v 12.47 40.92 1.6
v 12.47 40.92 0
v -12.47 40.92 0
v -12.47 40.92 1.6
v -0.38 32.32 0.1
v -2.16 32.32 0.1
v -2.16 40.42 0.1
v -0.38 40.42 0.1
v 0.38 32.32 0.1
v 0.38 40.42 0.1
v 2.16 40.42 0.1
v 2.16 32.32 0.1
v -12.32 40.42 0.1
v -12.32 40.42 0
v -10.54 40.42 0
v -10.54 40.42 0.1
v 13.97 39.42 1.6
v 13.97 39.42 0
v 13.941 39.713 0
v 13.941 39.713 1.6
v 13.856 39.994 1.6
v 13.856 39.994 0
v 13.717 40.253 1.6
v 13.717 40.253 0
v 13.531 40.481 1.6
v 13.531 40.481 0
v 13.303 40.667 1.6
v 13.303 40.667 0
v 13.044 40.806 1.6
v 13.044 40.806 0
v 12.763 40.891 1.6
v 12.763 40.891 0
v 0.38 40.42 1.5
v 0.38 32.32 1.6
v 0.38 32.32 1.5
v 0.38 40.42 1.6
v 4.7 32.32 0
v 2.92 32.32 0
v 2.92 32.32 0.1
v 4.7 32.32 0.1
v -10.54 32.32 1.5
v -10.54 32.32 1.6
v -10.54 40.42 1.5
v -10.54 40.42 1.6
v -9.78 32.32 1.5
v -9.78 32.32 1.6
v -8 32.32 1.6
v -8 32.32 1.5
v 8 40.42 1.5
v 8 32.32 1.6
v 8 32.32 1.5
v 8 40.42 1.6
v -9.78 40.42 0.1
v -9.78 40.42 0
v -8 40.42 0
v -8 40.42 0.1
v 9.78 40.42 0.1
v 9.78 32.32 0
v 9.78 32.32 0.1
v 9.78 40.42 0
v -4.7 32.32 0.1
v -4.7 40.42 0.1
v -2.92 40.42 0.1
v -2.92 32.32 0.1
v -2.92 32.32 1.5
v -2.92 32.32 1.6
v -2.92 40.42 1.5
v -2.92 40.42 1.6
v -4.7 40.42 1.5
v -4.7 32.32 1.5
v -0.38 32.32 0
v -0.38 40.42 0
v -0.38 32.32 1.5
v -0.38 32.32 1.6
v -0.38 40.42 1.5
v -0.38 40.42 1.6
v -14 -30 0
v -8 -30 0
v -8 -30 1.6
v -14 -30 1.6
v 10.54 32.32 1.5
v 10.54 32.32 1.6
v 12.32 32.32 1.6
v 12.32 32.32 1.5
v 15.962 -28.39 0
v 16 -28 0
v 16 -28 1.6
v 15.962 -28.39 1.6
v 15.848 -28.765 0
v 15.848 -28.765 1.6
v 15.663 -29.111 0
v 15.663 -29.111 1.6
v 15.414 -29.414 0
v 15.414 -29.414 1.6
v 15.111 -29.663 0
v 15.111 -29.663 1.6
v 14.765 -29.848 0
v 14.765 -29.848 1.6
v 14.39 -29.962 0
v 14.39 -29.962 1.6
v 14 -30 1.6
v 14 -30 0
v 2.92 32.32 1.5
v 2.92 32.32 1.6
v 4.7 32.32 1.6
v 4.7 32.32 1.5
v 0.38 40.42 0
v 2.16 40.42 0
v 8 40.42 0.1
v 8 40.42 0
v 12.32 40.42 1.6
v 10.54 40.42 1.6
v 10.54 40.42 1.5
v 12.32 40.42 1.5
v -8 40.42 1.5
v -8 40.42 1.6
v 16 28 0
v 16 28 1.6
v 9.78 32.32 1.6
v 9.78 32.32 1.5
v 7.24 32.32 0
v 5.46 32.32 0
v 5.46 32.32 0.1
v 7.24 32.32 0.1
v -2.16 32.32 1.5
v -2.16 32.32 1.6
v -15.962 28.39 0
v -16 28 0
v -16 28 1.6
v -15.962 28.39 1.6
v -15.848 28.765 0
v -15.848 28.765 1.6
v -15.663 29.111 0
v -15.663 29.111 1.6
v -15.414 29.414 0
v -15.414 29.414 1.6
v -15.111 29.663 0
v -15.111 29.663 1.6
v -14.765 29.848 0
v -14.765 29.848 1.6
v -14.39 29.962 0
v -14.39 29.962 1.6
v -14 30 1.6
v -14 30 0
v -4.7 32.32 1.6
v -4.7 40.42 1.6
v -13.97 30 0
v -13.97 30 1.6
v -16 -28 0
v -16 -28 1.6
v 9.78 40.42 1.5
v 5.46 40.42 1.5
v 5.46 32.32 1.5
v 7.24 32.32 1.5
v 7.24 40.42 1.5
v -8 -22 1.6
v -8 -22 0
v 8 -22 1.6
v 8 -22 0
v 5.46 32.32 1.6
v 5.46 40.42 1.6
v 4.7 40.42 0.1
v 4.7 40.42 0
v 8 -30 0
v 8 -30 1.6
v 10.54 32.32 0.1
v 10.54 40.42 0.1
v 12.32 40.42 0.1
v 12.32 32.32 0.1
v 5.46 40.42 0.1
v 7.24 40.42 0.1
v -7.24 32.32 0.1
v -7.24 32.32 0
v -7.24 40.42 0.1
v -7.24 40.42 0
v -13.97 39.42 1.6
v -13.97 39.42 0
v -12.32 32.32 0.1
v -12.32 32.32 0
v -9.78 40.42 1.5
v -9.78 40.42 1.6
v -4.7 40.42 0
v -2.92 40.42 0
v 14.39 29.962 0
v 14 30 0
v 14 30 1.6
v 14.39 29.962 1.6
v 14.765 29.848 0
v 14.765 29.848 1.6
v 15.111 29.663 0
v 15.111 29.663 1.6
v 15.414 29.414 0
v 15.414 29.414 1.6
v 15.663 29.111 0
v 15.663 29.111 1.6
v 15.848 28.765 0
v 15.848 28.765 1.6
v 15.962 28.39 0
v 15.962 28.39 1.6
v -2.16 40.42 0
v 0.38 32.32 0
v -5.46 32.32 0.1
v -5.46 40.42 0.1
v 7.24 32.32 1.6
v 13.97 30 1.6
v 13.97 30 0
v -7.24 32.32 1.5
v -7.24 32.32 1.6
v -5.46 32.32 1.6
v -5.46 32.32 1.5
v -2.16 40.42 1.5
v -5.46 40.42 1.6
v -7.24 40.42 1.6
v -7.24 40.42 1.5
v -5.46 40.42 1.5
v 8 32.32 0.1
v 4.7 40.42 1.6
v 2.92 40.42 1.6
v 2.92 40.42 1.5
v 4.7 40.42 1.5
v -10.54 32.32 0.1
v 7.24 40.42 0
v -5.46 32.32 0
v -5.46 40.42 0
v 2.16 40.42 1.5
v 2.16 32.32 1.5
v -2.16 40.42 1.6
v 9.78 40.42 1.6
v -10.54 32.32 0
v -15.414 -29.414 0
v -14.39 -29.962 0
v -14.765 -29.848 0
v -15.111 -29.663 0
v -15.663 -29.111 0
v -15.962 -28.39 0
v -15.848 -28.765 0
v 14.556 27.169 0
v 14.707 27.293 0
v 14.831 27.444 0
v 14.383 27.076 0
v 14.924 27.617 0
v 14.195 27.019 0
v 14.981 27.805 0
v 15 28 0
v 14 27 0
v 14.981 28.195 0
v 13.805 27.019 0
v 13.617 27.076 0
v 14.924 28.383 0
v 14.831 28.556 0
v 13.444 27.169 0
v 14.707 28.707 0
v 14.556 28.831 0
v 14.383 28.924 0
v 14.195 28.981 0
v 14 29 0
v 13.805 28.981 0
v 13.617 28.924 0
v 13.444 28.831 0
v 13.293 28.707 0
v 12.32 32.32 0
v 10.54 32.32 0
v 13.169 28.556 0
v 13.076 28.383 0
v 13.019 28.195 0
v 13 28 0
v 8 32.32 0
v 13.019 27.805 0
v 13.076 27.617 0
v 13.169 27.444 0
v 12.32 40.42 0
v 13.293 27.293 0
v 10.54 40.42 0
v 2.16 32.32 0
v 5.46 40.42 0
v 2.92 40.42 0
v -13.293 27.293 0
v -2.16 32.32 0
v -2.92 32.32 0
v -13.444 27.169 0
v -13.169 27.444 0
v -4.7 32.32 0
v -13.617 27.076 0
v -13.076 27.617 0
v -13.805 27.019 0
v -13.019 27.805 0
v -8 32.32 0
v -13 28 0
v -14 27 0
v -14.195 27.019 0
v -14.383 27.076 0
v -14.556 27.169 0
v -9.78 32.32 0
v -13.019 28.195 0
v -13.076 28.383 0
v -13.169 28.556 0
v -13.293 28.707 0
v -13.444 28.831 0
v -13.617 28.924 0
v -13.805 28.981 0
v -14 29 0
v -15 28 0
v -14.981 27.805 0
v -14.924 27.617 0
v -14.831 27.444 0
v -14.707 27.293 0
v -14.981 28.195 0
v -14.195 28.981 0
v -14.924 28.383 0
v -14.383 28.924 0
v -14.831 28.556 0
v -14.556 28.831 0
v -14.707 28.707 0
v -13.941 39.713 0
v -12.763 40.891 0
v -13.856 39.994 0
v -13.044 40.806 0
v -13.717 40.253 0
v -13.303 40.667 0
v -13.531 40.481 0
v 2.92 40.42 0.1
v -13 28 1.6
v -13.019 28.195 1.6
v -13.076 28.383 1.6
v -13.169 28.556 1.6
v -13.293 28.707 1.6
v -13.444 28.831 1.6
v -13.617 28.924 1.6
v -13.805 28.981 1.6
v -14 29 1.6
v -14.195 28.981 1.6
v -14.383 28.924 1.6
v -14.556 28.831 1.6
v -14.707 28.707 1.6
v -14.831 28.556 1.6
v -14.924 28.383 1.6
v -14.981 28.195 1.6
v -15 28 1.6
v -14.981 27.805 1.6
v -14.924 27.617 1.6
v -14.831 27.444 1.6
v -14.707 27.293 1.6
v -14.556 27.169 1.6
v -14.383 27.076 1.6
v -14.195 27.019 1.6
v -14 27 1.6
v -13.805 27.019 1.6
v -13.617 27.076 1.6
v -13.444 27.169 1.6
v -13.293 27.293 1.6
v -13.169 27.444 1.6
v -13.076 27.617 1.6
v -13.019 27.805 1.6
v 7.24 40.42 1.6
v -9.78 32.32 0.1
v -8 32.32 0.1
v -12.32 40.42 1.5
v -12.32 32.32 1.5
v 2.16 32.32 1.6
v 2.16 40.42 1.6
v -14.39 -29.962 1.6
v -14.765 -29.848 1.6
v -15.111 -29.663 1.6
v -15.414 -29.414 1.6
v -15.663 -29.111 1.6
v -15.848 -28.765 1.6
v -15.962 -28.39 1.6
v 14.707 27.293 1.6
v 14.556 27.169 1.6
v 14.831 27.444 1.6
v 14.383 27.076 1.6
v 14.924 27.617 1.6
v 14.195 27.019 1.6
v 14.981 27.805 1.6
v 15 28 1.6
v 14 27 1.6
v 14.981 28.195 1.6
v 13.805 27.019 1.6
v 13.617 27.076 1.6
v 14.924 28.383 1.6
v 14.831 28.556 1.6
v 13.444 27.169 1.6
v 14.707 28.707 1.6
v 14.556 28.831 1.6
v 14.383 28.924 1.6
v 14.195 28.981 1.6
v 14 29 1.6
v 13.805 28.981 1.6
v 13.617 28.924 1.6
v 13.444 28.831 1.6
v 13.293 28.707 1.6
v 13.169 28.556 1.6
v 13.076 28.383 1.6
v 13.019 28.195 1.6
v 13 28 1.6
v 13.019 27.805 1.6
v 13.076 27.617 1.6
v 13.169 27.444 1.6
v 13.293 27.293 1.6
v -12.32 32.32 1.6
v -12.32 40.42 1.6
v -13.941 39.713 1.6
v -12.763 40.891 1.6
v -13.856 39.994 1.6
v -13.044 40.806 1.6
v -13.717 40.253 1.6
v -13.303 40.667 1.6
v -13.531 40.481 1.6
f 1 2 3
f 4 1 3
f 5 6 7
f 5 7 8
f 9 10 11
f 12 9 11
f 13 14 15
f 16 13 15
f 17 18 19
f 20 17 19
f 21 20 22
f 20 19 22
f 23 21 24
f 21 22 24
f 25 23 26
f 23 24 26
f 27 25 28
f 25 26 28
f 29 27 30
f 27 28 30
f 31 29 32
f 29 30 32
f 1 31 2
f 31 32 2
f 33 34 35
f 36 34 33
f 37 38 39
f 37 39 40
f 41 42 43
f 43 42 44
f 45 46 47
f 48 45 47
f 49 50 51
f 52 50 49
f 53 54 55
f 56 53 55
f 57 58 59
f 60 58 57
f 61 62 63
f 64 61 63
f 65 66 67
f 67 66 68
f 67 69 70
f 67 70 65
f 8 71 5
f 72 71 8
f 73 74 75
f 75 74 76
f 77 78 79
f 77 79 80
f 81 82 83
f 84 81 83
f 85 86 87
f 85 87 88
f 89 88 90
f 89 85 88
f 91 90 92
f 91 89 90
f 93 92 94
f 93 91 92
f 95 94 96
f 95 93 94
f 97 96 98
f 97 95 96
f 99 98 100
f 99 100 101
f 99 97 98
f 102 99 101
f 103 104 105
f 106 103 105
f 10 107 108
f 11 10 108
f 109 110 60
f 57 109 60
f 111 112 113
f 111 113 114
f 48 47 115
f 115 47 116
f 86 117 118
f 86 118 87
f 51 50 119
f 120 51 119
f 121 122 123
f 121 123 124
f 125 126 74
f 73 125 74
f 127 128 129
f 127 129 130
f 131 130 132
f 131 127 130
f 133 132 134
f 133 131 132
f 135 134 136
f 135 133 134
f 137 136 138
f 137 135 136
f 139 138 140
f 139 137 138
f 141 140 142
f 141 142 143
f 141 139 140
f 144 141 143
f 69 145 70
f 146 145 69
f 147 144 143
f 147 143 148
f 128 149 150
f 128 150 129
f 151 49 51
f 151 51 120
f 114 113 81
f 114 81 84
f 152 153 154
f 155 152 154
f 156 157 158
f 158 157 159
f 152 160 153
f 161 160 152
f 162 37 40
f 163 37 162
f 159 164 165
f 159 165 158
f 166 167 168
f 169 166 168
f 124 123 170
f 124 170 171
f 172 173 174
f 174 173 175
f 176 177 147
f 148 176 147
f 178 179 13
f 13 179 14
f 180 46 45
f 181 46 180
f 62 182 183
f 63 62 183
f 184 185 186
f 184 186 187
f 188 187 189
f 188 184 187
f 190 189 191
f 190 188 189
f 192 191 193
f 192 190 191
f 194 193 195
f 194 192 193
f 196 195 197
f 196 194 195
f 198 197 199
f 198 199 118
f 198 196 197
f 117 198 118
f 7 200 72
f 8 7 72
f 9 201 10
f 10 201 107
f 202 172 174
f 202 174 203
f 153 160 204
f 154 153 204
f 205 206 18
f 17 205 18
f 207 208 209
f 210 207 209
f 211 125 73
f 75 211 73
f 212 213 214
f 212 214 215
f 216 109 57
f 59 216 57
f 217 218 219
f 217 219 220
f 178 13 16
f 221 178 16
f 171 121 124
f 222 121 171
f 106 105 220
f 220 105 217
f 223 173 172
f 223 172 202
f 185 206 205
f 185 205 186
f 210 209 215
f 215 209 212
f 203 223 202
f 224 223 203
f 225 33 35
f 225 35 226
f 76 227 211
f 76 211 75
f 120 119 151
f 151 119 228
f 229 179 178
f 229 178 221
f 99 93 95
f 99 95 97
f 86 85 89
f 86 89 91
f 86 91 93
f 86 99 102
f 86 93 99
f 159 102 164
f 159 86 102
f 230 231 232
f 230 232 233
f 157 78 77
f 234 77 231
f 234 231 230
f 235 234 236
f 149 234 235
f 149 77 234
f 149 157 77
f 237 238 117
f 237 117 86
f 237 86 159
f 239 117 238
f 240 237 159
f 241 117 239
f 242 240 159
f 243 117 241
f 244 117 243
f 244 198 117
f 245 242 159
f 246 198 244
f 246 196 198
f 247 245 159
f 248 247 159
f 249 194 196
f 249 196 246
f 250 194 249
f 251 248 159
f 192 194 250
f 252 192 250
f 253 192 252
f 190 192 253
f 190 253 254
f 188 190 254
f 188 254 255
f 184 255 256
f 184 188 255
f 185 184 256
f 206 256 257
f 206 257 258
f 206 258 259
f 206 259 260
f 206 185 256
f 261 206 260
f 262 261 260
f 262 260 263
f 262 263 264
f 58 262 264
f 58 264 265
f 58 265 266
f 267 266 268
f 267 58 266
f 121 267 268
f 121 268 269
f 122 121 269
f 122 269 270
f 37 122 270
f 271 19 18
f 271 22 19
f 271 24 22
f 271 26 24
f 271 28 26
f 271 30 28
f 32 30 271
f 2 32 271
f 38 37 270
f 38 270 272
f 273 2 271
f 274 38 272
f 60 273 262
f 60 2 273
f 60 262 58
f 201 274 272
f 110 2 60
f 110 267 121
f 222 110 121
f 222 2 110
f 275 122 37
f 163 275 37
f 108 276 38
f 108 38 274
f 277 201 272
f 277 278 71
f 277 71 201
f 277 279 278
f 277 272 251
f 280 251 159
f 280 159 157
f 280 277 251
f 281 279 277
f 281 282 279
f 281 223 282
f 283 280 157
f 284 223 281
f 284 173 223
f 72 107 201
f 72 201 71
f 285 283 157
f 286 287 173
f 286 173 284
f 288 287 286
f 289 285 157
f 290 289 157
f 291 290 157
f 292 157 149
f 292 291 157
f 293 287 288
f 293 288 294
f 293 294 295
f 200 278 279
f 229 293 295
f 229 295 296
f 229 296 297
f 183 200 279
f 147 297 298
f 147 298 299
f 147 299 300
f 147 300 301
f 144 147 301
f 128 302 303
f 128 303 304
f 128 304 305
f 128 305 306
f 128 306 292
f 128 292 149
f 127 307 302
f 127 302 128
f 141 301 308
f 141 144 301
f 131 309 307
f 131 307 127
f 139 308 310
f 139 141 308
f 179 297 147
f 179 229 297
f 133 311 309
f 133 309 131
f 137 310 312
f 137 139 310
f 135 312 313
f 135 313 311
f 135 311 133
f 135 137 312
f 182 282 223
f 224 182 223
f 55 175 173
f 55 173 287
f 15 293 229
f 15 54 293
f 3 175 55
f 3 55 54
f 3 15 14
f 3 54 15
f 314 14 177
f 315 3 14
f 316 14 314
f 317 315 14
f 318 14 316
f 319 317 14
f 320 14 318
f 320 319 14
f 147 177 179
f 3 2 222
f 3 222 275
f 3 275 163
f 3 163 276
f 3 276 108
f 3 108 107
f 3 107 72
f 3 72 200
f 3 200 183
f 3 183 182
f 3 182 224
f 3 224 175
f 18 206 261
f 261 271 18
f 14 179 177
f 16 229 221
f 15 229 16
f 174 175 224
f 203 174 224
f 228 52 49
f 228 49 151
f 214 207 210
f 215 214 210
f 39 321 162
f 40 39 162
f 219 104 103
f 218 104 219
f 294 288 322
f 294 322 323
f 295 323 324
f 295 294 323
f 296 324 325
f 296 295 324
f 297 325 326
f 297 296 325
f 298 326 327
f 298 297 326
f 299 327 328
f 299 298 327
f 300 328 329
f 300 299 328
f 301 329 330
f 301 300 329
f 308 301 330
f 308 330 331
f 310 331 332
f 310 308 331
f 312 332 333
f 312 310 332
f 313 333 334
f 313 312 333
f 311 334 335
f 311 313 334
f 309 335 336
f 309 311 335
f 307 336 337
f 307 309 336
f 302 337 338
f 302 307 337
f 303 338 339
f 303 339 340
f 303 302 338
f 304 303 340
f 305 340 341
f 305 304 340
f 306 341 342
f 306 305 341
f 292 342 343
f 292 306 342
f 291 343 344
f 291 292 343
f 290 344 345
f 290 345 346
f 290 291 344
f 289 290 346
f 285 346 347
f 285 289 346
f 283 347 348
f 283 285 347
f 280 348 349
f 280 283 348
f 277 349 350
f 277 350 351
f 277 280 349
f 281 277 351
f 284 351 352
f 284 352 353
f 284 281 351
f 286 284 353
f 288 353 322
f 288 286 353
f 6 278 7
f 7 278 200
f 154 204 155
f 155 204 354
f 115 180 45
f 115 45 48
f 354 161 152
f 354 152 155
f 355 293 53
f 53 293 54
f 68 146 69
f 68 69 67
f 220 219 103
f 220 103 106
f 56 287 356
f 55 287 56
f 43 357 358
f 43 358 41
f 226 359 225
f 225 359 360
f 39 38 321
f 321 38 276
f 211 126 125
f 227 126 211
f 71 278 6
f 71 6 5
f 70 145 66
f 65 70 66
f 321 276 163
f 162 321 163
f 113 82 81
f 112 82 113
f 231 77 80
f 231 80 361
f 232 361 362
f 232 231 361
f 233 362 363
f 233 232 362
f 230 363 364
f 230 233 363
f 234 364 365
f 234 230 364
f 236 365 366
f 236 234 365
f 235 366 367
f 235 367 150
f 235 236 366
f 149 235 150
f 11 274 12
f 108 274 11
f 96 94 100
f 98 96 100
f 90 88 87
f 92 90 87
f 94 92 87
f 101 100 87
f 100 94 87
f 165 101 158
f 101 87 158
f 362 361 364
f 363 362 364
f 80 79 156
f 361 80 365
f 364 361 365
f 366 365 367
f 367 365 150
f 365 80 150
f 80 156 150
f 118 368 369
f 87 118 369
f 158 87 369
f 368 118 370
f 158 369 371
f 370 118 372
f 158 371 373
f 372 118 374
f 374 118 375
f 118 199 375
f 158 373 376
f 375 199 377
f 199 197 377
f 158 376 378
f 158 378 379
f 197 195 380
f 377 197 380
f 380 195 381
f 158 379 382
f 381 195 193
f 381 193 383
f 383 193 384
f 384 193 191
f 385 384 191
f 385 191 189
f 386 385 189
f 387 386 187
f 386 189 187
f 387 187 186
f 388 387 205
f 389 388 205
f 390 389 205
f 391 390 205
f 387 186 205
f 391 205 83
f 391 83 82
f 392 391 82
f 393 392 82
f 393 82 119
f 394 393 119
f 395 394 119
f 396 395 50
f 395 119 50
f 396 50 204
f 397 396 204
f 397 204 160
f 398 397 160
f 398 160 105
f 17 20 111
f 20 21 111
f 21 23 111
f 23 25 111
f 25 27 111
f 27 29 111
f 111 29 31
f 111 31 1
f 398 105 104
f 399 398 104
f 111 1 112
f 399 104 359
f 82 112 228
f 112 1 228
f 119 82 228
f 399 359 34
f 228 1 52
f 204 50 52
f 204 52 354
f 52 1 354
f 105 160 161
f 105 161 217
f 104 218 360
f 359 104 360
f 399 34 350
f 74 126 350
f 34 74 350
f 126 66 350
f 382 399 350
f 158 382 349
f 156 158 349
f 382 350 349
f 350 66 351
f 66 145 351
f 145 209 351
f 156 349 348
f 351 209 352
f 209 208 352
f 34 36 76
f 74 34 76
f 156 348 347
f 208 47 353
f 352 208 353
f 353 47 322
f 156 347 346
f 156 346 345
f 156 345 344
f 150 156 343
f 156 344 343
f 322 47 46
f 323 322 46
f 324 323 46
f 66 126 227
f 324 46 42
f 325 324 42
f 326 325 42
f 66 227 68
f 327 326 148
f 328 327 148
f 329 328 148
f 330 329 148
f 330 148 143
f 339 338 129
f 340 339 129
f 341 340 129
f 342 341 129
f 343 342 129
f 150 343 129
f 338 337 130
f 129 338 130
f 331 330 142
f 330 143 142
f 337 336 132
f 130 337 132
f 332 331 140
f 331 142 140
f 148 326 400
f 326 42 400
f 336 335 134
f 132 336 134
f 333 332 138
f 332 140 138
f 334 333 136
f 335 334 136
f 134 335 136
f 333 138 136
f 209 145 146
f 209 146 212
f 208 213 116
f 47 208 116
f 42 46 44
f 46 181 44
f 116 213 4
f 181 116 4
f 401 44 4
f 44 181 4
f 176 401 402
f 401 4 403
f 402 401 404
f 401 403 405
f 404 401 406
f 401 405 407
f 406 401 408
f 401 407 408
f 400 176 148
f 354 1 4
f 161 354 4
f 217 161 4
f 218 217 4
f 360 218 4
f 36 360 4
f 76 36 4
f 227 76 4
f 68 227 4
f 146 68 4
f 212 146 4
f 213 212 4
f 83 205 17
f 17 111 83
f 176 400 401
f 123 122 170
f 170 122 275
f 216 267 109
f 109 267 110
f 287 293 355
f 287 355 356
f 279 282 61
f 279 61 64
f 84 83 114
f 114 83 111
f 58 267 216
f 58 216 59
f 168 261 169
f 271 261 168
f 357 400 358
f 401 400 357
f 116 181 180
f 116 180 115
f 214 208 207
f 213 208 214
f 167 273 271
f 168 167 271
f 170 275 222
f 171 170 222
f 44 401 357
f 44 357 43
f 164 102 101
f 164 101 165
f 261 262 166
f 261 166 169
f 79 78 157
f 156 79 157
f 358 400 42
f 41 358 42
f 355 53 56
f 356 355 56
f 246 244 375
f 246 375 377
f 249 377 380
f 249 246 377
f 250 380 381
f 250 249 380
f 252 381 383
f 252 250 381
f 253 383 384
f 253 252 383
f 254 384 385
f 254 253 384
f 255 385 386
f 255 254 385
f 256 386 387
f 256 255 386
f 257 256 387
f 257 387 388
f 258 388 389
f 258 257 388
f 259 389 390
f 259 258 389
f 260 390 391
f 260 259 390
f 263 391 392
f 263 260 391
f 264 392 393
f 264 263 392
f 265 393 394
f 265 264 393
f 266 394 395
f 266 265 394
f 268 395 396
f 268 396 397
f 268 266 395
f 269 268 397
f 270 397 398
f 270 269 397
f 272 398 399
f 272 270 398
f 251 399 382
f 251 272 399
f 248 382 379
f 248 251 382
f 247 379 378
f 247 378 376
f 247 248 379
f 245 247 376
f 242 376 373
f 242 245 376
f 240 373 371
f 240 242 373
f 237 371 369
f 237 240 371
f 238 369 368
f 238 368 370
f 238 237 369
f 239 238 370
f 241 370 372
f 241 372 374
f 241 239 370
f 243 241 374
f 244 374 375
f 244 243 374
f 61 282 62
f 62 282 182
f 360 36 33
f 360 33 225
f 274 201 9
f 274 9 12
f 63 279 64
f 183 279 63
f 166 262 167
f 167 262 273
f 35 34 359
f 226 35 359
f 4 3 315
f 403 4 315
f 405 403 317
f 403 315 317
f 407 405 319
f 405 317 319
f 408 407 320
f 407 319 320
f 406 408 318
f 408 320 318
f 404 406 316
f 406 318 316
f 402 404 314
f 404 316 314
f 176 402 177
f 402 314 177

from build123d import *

# Parameters (mm, degrees)
SKETCH_1_R          = 1
EXTRUDE_1_DEPTH     = 1.6
SKETCH_2_W          = 16
SKETCH_2_H          = 8
CUT_EXTRUDE_1_DEPTH = 1.6
EXTRUDE_2_DEPTH     = 1.6
SKETCH_4_W          = 1.78
SKETCH_4_H          = 8.1
CUT_EXTRUDE_2_DEPTH = 0.1
CUT_EXTRUDE_START   = 1.6
SKETCH_5_W          = 1.78
SKETCH_5_H          = 8.1
CUT_EXTRUDE_3_DEPTH = 0.1


with BuildPart() as part:
    # 草图1 → 凸台-拉伸1 (new body)
    with BuildSketch(Plane.XY):
        with BuildLine():
            Line((-14, 30), (14, 30))
            ThreePointArc((14, 30), (15.414213562, 29.414213562), (16, 28))
            Line((16, 28), (16, -28))
            ThreePointArc((16, -28), (15.414213562, -29.414213562), (14, -30))
            Line((14, -30), (-14, -30))
            ThreePointArc((-14, -30), (-15.414213562, -29.414213562), (-16, -28))
            Line((-16, -28), (-16, 28))
            ThreePointArc((-16, 28), (-15.414213562, 29.414213562), (-14, 30))
        make_face()
        with Locations((-14, 28)):
            Circle(SKETCH_1_R, mode=Mode.SUBTRACT)
        with Locations((14, 28)):
            Circle(SKETCH_1_R, mode=Mode.SUBTRACT)
    extrude(amount=EXTRUDE_1_DEPTH)

    # 草图2 → 切除-拉伸1 (cut)
    with BuildSketch(Plane.XY):
        with Locations((0, -26)):
            Rectangle(SKETCH_2_W, SKETCH_2_H)
    extrude(amount=CUT_EXTRUDE_1_DEPTH, mode=Mode.SUBTRACT)

    # 草图3 → 凸台-拉伸2 (add)
    with BuildSketch(Plane.XY):
        with BuildLine():
            Line((-13.97, 30), (13.97, 30))
            Line((13.97, 30), (13.97, 39.42))
            ThreePointArc((13.97, 39.42), (13.530660172, 40.480660172), (12.47, 40.92))
            Line((12.47, 40.92), (-12.47, 40.92))
            ThreePointArc((-12.47, 40.92), (-13.530660172, 40.480660172), (-13.97, 39.42))
            Line((-13.97, 39.42), (-13.97, 30))
        make_face()
    extrude(amount=EXTRUDE_2_DEPTH)

    # 草图4 → 切除-拉伸2 (cut)
    with BuildSketch(Plane.XY):
        with Locations((-1.27, 36.37)):
            Rectangle(SKETCH_4_W, SKETCH_4_H)
        with Locations((-3.81, 36.37)):
            Rectangle(SKETCH_4_W, SKETCH_4_H)
        with Locations((-6.35, 36.37)):
            Rectangle(SKETCH_4_W, SKETCH_4_H)
        with Locations((-8.89, 36.37)):
            Rectangle(SKETCH_4_W, SKETCH_4_H)
        with Locations((-11.43, 36.37)):
            Rectangle(SKETCH_4_W, SKETCH_4_H)
        with Locations((11.43, 36.37)):
            Rectangle(SKETCH_4_W, SKETCH_4_H)
        with Locations((8.89, 36.37)):
            Rectangle(SKETCH_4_W, SKETCH_4_H)
        with Locations((6.35, 36.37)):
            Rectangle(SKETCH_4_W, SKETCH_4_H)
        with Locations((3.81, 36.37)):
            Rectangle(SKETCH_4_W, SKETCH_4_H)
        with Locations((1.27, 36.37)):
            Rectangle(SKETCH_4_W, SKETCH_4_H)
    extrude(amount=CUT_EXTRUDE_2_DEPTH, mode=Mode.SUBTRACT)

    # 草图5 → 切除-拉伸3 (cut)
    with BuildSketch(Plane.XY.offset(CUT_EXTRUDE_START)):
        with Locations((-3.81, 36.37)):
            Rectangle(SKETCH_5_W, SKETCH_5_H)
        with Locations((-1.27, 36.37)):
            Rectangle(SKETCH_5_W, SKETCH_5_H)
        with Locations((-11.43, 36.37)):
            Rectangle(SKETCH_5_W, SKETCH_5_H)
        with Locations((-8.89, 36.37)):
            Rectangle(SKETCH_5_W, SKETCH_5_H)
        with Locations((-6.35, 36.37)):
            Rectangle(SKETCH_5_W, SKETCH_5_H)
        with Locations((1.27, 36.37)):
            Rectangle(SKETCH_5_W, SKETCH_5_H)
        with Locations((3.81, 36.37)):
            Rectangle(SKETCH_5_W, SKETCH_5_H)
        with Locations((6.35, 36.37)):
            Rectangle(SKETCH_5_W, SKETCH_5_H)
        with Locations((8.89, 36.37)):
            Rectangle(SKETCH_5_W, SKETCH_5_H)
        with Locations((11.43, 36.37)):
            Rectangle(SKETCH_5_W, SKETCH_5_H)
    extrude(amount=-CUT_EXTRUDE_3_DEPTH, mode=Mode.SUBTRACT)


solid = part.part
